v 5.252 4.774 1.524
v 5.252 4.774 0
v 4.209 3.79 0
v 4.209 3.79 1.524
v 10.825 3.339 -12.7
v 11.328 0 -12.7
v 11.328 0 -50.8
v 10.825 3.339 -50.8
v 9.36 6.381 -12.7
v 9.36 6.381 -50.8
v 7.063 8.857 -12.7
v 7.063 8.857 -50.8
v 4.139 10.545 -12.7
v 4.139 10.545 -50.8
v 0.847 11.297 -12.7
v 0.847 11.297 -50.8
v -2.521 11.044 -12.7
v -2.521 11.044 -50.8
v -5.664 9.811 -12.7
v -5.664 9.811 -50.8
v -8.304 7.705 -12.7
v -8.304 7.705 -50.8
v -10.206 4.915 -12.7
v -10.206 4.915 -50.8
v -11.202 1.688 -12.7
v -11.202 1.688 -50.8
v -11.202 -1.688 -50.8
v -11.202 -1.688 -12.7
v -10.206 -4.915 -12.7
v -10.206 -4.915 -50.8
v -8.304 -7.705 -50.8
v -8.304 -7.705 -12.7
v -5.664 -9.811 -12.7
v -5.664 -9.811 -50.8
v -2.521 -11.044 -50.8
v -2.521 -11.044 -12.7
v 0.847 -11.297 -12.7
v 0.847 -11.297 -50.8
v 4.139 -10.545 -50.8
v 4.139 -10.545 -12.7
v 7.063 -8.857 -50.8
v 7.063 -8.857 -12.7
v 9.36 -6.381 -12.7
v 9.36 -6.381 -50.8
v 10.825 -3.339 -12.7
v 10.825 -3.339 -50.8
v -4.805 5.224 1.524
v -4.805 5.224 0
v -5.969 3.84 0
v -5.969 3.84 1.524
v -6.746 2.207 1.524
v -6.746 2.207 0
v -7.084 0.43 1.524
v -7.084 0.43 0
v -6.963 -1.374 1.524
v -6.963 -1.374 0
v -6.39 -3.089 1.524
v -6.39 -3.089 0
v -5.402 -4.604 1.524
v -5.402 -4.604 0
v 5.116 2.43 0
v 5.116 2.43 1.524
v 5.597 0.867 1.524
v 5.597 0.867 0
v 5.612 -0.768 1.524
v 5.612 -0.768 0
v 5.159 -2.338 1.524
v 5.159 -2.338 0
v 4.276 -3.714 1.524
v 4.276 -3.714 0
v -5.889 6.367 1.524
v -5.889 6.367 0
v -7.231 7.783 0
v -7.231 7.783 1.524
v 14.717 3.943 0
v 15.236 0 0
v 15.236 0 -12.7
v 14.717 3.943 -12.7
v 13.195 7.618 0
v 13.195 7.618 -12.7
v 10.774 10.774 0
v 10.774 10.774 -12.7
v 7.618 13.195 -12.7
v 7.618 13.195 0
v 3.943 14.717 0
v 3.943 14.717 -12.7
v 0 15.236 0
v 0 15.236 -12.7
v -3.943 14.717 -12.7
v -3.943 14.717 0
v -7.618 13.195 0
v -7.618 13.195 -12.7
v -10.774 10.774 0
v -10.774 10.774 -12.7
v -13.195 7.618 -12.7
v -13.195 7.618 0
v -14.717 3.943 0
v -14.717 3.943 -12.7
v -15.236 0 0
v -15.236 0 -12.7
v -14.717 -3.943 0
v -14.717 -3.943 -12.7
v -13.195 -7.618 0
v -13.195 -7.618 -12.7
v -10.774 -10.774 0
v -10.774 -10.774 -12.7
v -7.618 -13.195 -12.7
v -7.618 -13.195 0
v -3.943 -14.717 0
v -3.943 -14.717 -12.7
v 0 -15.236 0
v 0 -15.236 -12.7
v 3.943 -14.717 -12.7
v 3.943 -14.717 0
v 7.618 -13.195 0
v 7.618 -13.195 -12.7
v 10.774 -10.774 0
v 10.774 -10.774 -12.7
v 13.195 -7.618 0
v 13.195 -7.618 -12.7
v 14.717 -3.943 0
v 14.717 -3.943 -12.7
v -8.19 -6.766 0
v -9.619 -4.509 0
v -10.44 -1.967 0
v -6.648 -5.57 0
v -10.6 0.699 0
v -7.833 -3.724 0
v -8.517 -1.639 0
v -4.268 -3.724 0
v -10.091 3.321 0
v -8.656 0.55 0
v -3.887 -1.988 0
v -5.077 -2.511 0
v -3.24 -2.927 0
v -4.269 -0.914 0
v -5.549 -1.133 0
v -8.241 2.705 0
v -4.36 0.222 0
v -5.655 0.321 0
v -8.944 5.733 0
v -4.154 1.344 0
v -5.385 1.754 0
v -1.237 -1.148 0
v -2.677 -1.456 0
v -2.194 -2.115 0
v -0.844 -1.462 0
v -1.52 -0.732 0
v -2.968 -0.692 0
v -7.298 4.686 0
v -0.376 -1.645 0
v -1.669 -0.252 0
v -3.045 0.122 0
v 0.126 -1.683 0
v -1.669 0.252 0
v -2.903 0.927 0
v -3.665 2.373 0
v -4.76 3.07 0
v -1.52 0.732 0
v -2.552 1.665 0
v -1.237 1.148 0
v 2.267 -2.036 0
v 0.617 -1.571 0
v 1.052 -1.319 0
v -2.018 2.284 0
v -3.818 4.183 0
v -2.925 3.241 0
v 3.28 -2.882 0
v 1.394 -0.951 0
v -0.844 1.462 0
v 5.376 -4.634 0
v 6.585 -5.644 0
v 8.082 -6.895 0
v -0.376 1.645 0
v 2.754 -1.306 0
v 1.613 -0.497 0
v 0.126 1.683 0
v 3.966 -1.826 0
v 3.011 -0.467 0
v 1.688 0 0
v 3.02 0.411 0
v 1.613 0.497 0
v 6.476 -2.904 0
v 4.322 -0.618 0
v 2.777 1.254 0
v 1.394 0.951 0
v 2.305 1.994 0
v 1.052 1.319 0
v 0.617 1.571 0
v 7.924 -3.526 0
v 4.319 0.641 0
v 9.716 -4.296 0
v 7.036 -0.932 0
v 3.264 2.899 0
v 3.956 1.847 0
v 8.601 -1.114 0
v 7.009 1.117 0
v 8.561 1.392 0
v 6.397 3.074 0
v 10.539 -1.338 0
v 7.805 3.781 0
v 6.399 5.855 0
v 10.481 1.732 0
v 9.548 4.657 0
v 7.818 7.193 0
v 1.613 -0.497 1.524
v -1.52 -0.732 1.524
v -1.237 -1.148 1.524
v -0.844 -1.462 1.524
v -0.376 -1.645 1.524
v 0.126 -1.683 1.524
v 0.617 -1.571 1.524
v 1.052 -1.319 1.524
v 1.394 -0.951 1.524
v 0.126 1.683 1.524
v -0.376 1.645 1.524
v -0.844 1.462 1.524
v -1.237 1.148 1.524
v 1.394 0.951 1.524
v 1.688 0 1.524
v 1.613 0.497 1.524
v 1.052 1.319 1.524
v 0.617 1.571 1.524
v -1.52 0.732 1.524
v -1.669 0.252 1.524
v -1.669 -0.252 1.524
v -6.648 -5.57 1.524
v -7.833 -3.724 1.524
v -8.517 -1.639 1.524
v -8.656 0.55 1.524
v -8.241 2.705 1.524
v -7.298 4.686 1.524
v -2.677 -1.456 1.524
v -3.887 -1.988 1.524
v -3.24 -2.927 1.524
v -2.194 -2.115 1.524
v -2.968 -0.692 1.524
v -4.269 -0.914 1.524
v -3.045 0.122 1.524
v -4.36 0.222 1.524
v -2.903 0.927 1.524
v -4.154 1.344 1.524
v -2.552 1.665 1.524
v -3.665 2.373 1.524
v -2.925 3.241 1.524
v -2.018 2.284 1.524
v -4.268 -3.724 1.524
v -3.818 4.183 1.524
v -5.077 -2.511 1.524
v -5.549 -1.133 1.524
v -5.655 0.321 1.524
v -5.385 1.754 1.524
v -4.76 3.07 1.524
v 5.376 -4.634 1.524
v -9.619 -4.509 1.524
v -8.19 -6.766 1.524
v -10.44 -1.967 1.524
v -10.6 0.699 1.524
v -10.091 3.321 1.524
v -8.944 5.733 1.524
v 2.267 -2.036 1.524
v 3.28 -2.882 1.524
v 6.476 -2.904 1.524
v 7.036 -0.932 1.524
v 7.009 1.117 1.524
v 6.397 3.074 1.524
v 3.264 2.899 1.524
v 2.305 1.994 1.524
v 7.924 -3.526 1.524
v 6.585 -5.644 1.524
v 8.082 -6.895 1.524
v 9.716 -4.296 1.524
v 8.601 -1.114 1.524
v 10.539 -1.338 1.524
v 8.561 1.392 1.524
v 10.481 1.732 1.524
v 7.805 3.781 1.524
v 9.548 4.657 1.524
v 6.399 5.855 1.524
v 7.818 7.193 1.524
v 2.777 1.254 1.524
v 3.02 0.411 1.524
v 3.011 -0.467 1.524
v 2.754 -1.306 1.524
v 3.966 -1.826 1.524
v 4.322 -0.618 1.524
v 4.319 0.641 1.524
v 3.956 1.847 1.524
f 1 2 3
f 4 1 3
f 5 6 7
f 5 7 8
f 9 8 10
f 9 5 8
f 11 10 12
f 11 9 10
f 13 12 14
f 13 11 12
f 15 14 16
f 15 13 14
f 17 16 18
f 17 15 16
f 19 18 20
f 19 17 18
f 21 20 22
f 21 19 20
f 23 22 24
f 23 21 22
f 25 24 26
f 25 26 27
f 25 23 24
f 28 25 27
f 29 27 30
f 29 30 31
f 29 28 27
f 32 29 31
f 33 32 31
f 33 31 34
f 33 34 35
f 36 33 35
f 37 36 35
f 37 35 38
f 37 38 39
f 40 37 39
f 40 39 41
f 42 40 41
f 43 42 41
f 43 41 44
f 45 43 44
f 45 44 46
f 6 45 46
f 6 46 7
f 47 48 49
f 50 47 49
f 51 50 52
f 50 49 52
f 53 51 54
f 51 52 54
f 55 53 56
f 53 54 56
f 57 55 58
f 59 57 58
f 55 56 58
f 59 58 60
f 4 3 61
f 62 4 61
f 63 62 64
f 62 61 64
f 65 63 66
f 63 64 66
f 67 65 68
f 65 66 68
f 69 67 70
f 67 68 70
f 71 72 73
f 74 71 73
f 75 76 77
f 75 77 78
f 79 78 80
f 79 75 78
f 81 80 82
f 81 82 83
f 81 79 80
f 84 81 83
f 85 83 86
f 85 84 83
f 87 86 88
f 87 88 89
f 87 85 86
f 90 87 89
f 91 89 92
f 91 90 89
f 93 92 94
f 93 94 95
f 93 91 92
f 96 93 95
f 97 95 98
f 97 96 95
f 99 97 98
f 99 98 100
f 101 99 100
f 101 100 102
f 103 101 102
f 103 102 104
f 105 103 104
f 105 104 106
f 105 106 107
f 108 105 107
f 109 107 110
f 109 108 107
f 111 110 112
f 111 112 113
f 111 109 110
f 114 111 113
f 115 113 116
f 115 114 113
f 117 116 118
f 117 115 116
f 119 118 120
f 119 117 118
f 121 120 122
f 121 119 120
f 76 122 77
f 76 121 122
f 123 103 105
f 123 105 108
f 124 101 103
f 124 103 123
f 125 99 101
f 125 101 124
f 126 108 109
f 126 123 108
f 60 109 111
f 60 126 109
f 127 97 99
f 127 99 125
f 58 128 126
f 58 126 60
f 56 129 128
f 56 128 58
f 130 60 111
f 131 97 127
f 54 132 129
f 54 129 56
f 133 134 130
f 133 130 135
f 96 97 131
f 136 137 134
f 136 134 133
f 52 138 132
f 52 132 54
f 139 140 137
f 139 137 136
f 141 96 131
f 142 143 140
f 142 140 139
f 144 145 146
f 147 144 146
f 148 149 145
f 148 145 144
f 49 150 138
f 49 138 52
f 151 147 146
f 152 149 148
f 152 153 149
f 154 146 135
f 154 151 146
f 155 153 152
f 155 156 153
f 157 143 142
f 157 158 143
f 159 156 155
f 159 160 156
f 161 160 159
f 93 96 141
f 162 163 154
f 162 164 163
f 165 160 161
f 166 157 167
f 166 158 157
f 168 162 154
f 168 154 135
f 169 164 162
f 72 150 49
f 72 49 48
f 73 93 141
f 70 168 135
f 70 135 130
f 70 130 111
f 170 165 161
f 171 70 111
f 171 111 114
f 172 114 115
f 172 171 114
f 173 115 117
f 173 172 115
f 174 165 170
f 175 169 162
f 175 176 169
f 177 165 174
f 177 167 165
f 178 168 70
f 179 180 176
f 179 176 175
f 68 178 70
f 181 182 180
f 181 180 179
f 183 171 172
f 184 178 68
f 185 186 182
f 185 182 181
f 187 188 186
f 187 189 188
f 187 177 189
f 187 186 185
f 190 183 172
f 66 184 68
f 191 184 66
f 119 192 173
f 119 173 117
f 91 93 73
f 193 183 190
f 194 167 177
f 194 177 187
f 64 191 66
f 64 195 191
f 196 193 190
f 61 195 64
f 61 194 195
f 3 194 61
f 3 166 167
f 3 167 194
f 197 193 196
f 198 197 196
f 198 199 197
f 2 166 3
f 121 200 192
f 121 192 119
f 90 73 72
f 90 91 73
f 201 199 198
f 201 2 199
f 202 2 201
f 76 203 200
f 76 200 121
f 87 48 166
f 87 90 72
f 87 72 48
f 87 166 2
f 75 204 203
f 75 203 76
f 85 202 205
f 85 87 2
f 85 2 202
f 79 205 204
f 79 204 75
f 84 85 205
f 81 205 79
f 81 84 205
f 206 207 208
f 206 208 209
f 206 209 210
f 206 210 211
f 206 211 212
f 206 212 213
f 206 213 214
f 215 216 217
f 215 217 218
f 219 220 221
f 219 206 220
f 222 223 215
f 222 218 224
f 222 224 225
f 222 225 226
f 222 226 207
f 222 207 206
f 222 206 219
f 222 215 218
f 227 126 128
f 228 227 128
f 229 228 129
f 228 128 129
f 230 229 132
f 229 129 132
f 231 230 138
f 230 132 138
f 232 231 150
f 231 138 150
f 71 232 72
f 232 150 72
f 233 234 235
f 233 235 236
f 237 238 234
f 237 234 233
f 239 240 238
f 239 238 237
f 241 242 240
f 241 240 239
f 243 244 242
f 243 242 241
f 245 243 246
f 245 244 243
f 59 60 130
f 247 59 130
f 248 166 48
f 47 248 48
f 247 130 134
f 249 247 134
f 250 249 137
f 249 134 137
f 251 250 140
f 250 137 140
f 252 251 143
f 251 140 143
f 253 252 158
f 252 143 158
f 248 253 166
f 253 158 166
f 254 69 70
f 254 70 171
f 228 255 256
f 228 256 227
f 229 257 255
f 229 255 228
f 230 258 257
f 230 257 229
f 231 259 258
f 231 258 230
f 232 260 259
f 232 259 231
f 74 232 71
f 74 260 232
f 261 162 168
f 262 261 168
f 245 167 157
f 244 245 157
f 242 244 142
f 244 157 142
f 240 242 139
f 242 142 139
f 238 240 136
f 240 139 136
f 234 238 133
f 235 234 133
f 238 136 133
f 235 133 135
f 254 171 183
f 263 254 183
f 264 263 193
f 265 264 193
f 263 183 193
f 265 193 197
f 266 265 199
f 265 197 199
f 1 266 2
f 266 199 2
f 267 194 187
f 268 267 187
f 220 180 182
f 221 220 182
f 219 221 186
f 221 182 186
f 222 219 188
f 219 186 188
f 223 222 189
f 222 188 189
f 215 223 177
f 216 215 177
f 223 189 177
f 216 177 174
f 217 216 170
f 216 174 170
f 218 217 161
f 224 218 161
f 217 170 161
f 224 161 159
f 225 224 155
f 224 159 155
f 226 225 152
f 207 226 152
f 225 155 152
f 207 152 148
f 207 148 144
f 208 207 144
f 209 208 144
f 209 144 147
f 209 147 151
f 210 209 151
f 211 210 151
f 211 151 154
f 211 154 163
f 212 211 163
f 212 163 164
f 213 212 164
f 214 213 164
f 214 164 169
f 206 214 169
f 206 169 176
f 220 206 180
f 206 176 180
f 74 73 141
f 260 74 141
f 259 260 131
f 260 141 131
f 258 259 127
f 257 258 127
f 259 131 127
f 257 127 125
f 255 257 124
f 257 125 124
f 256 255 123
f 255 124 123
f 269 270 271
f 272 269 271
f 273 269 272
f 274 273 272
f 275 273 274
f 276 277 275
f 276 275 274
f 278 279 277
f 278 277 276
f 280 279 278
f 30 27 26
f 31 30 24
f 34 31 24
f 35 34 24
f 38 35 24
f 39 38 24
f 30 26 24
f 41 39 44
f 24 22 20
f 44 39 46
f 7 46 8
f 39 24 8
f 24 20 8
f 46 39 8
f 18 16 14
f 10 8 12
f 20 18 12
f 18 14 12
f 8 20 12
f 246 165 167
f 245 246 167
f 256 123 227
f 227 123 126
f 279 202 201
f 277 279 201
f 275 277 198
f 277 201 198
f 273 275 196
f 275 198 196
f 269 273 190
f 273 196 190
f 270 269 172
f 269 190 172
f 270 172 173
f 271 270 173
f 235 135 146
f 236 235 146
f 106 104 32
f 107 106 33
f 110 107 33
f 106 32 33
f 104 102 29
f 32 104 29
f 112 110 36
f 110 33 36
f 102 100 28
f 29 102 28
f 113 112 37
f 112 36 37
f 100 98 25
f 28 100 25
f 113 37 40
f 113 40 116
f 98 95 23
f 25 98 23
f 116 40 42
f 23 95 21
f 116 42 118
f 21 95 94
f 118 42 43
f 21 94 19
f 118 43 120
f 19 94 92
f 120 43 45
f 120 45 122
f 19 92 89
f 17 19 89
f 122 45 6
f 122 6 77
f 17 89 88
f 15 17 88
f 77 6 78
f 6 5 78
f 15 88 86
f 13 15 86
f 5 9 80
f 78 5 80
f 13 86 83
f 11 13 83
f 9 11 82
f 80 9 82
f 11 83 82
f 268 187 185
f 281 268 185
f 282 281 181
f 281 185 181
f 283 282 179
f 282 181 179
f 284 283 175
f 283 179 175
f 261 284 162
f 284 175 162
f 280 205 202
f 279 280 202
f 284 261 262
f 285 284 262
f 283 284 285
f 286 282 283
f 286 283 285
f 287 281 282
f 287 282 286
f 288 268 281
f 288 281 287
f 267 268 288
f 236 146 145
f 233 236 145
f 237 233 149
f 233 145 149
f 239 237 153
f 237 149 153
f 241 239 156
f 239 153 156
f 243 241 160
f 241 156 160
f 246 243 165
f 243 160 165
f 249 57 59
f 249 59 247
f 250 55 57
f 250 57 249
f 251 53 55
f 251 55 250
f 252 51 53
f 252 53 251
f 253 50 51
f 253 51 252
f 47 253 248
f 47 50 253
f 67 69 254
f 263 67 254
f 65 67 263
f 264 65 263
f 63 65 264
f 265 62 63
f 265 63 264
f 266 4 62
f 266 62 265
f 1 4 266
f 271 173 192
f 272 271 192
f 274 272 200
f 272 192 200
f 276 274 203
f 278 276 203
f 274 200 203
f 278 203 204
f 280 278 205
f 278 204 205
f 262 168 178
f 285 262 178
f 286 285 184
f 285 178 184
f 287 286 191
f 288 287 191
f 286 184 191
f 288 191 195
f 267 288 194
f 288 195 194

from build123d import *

# Parameters (mm, degrees)
F0_R     = 11.328224
F1_DEPTH = 50.8
F0_R_2   = 15.236447
F2_DEPTH = 12.7
F3_R     = 1.687605
F4_DEPTH = 1.524


with BuildPart() as f1:
    # F0 (on Top) → F1 (new body)
    with BuildSketch(Plane.XY):
        Circle(F0_R)
    extrude(amount=-F1_DEPTH)

    # F0 (on Top) → F2 (join)
    with BuildSketch(Plane.XY):
        Circle(F0_R_2)
        Circle(F0_R, mode=Mode.SUBTRACT)
    extrude(amount=-F2_DEPTH)

    # F3 (on Top) → F4 (join)
    with BuildSketch(Plane.XY):
        Circle(F3_R)
        with BuildLine():
            ThreePointArc((-2.193762, -2.115145), (-3.044929, 0.121791), (-2.017821, 2.2836))
            Line((-2.017821, 2.2836), (-2.92536, 3.240976))
            ThreePointArc((-2.92536, 3.240976), (-4.3603, 0.222363), (-3.239887, -2.926566))
            Line((-3.239887, -2.926566), (-2.193762, -2.115145))
        make_face()
        with BuildLine():
            ThreePointArc((-4.267654, -3.723748), (-5.65473, 0.321247), (-3.818462, 4.183123))
            Line((-3.818462, 4.183123), (-4.804929, 5.223764))
            ThreePointArc((-4.804929, 5.223764), (-7.084475, 0.430437), (-5.402019, -4.603612))
            Line((-5.402019, -4.603612), (-4.267654, -3.723748))
        make_face()
        with BuildLine():
            ThreePointArc((-6.64799, -5.570042), (-8.65553, 0.550403), (-5.888899, 6.367261))
            Line((-5.888899, 6.367261), (-7.230815, 7.782869))
            ThreePointArc((-7.230815, 7.782869), (-10.600437, 0.698907), (-8.19006, -6.76614))
            Line((-8.19006, -6.76614), (-6.64799, -5.570042))
        make_face()
        with BuildLine():
            Line((3.264468, 2.899122), (2.304564, 1.993843))
            ThreePointArc((2.304564, 1.993843), (3.047234, -0.028162), (2.26732, -2.036096))
            Line((2.26732, -2.036096), (3.279597, -2.881997))
            ThreePointArc((3.279597, -2.881997), (4.365951, 0.011425), (3.264468, 2.899122))
        make_face()
        with BuildLine():
            ThreePointArc((4.209008, 3.78991), (5.663624, 0.050381), (4.275763, -3.714434))
            Line((4.275763, -3.714434), (5.376066, -4.633893))
            ThreePointArc((5.376066, -4.633893), (7.096924, 0.093408), (5.252245, 4.77378))
            Line((5.252245, 4.77378), (4.209008, 3.78991))
        make_face()
        with BuildLine():
            ThreePointArc((6.398567, 5.854868), (8.671871, 0.140687), (6.585121, -5.644229))
            Line((6.585121, -5.644229), (8.081886, -6.894988))
            ThreePointArc((8.081886, -6.894988), (10.621584, 0.199216), (7.817651, 7.193196))
            Line((7.817651, 7.193196), (6.398567, 5.854868))
        make_face()
    extrude(amount=F4_DEPTH)


solid = f1.part
